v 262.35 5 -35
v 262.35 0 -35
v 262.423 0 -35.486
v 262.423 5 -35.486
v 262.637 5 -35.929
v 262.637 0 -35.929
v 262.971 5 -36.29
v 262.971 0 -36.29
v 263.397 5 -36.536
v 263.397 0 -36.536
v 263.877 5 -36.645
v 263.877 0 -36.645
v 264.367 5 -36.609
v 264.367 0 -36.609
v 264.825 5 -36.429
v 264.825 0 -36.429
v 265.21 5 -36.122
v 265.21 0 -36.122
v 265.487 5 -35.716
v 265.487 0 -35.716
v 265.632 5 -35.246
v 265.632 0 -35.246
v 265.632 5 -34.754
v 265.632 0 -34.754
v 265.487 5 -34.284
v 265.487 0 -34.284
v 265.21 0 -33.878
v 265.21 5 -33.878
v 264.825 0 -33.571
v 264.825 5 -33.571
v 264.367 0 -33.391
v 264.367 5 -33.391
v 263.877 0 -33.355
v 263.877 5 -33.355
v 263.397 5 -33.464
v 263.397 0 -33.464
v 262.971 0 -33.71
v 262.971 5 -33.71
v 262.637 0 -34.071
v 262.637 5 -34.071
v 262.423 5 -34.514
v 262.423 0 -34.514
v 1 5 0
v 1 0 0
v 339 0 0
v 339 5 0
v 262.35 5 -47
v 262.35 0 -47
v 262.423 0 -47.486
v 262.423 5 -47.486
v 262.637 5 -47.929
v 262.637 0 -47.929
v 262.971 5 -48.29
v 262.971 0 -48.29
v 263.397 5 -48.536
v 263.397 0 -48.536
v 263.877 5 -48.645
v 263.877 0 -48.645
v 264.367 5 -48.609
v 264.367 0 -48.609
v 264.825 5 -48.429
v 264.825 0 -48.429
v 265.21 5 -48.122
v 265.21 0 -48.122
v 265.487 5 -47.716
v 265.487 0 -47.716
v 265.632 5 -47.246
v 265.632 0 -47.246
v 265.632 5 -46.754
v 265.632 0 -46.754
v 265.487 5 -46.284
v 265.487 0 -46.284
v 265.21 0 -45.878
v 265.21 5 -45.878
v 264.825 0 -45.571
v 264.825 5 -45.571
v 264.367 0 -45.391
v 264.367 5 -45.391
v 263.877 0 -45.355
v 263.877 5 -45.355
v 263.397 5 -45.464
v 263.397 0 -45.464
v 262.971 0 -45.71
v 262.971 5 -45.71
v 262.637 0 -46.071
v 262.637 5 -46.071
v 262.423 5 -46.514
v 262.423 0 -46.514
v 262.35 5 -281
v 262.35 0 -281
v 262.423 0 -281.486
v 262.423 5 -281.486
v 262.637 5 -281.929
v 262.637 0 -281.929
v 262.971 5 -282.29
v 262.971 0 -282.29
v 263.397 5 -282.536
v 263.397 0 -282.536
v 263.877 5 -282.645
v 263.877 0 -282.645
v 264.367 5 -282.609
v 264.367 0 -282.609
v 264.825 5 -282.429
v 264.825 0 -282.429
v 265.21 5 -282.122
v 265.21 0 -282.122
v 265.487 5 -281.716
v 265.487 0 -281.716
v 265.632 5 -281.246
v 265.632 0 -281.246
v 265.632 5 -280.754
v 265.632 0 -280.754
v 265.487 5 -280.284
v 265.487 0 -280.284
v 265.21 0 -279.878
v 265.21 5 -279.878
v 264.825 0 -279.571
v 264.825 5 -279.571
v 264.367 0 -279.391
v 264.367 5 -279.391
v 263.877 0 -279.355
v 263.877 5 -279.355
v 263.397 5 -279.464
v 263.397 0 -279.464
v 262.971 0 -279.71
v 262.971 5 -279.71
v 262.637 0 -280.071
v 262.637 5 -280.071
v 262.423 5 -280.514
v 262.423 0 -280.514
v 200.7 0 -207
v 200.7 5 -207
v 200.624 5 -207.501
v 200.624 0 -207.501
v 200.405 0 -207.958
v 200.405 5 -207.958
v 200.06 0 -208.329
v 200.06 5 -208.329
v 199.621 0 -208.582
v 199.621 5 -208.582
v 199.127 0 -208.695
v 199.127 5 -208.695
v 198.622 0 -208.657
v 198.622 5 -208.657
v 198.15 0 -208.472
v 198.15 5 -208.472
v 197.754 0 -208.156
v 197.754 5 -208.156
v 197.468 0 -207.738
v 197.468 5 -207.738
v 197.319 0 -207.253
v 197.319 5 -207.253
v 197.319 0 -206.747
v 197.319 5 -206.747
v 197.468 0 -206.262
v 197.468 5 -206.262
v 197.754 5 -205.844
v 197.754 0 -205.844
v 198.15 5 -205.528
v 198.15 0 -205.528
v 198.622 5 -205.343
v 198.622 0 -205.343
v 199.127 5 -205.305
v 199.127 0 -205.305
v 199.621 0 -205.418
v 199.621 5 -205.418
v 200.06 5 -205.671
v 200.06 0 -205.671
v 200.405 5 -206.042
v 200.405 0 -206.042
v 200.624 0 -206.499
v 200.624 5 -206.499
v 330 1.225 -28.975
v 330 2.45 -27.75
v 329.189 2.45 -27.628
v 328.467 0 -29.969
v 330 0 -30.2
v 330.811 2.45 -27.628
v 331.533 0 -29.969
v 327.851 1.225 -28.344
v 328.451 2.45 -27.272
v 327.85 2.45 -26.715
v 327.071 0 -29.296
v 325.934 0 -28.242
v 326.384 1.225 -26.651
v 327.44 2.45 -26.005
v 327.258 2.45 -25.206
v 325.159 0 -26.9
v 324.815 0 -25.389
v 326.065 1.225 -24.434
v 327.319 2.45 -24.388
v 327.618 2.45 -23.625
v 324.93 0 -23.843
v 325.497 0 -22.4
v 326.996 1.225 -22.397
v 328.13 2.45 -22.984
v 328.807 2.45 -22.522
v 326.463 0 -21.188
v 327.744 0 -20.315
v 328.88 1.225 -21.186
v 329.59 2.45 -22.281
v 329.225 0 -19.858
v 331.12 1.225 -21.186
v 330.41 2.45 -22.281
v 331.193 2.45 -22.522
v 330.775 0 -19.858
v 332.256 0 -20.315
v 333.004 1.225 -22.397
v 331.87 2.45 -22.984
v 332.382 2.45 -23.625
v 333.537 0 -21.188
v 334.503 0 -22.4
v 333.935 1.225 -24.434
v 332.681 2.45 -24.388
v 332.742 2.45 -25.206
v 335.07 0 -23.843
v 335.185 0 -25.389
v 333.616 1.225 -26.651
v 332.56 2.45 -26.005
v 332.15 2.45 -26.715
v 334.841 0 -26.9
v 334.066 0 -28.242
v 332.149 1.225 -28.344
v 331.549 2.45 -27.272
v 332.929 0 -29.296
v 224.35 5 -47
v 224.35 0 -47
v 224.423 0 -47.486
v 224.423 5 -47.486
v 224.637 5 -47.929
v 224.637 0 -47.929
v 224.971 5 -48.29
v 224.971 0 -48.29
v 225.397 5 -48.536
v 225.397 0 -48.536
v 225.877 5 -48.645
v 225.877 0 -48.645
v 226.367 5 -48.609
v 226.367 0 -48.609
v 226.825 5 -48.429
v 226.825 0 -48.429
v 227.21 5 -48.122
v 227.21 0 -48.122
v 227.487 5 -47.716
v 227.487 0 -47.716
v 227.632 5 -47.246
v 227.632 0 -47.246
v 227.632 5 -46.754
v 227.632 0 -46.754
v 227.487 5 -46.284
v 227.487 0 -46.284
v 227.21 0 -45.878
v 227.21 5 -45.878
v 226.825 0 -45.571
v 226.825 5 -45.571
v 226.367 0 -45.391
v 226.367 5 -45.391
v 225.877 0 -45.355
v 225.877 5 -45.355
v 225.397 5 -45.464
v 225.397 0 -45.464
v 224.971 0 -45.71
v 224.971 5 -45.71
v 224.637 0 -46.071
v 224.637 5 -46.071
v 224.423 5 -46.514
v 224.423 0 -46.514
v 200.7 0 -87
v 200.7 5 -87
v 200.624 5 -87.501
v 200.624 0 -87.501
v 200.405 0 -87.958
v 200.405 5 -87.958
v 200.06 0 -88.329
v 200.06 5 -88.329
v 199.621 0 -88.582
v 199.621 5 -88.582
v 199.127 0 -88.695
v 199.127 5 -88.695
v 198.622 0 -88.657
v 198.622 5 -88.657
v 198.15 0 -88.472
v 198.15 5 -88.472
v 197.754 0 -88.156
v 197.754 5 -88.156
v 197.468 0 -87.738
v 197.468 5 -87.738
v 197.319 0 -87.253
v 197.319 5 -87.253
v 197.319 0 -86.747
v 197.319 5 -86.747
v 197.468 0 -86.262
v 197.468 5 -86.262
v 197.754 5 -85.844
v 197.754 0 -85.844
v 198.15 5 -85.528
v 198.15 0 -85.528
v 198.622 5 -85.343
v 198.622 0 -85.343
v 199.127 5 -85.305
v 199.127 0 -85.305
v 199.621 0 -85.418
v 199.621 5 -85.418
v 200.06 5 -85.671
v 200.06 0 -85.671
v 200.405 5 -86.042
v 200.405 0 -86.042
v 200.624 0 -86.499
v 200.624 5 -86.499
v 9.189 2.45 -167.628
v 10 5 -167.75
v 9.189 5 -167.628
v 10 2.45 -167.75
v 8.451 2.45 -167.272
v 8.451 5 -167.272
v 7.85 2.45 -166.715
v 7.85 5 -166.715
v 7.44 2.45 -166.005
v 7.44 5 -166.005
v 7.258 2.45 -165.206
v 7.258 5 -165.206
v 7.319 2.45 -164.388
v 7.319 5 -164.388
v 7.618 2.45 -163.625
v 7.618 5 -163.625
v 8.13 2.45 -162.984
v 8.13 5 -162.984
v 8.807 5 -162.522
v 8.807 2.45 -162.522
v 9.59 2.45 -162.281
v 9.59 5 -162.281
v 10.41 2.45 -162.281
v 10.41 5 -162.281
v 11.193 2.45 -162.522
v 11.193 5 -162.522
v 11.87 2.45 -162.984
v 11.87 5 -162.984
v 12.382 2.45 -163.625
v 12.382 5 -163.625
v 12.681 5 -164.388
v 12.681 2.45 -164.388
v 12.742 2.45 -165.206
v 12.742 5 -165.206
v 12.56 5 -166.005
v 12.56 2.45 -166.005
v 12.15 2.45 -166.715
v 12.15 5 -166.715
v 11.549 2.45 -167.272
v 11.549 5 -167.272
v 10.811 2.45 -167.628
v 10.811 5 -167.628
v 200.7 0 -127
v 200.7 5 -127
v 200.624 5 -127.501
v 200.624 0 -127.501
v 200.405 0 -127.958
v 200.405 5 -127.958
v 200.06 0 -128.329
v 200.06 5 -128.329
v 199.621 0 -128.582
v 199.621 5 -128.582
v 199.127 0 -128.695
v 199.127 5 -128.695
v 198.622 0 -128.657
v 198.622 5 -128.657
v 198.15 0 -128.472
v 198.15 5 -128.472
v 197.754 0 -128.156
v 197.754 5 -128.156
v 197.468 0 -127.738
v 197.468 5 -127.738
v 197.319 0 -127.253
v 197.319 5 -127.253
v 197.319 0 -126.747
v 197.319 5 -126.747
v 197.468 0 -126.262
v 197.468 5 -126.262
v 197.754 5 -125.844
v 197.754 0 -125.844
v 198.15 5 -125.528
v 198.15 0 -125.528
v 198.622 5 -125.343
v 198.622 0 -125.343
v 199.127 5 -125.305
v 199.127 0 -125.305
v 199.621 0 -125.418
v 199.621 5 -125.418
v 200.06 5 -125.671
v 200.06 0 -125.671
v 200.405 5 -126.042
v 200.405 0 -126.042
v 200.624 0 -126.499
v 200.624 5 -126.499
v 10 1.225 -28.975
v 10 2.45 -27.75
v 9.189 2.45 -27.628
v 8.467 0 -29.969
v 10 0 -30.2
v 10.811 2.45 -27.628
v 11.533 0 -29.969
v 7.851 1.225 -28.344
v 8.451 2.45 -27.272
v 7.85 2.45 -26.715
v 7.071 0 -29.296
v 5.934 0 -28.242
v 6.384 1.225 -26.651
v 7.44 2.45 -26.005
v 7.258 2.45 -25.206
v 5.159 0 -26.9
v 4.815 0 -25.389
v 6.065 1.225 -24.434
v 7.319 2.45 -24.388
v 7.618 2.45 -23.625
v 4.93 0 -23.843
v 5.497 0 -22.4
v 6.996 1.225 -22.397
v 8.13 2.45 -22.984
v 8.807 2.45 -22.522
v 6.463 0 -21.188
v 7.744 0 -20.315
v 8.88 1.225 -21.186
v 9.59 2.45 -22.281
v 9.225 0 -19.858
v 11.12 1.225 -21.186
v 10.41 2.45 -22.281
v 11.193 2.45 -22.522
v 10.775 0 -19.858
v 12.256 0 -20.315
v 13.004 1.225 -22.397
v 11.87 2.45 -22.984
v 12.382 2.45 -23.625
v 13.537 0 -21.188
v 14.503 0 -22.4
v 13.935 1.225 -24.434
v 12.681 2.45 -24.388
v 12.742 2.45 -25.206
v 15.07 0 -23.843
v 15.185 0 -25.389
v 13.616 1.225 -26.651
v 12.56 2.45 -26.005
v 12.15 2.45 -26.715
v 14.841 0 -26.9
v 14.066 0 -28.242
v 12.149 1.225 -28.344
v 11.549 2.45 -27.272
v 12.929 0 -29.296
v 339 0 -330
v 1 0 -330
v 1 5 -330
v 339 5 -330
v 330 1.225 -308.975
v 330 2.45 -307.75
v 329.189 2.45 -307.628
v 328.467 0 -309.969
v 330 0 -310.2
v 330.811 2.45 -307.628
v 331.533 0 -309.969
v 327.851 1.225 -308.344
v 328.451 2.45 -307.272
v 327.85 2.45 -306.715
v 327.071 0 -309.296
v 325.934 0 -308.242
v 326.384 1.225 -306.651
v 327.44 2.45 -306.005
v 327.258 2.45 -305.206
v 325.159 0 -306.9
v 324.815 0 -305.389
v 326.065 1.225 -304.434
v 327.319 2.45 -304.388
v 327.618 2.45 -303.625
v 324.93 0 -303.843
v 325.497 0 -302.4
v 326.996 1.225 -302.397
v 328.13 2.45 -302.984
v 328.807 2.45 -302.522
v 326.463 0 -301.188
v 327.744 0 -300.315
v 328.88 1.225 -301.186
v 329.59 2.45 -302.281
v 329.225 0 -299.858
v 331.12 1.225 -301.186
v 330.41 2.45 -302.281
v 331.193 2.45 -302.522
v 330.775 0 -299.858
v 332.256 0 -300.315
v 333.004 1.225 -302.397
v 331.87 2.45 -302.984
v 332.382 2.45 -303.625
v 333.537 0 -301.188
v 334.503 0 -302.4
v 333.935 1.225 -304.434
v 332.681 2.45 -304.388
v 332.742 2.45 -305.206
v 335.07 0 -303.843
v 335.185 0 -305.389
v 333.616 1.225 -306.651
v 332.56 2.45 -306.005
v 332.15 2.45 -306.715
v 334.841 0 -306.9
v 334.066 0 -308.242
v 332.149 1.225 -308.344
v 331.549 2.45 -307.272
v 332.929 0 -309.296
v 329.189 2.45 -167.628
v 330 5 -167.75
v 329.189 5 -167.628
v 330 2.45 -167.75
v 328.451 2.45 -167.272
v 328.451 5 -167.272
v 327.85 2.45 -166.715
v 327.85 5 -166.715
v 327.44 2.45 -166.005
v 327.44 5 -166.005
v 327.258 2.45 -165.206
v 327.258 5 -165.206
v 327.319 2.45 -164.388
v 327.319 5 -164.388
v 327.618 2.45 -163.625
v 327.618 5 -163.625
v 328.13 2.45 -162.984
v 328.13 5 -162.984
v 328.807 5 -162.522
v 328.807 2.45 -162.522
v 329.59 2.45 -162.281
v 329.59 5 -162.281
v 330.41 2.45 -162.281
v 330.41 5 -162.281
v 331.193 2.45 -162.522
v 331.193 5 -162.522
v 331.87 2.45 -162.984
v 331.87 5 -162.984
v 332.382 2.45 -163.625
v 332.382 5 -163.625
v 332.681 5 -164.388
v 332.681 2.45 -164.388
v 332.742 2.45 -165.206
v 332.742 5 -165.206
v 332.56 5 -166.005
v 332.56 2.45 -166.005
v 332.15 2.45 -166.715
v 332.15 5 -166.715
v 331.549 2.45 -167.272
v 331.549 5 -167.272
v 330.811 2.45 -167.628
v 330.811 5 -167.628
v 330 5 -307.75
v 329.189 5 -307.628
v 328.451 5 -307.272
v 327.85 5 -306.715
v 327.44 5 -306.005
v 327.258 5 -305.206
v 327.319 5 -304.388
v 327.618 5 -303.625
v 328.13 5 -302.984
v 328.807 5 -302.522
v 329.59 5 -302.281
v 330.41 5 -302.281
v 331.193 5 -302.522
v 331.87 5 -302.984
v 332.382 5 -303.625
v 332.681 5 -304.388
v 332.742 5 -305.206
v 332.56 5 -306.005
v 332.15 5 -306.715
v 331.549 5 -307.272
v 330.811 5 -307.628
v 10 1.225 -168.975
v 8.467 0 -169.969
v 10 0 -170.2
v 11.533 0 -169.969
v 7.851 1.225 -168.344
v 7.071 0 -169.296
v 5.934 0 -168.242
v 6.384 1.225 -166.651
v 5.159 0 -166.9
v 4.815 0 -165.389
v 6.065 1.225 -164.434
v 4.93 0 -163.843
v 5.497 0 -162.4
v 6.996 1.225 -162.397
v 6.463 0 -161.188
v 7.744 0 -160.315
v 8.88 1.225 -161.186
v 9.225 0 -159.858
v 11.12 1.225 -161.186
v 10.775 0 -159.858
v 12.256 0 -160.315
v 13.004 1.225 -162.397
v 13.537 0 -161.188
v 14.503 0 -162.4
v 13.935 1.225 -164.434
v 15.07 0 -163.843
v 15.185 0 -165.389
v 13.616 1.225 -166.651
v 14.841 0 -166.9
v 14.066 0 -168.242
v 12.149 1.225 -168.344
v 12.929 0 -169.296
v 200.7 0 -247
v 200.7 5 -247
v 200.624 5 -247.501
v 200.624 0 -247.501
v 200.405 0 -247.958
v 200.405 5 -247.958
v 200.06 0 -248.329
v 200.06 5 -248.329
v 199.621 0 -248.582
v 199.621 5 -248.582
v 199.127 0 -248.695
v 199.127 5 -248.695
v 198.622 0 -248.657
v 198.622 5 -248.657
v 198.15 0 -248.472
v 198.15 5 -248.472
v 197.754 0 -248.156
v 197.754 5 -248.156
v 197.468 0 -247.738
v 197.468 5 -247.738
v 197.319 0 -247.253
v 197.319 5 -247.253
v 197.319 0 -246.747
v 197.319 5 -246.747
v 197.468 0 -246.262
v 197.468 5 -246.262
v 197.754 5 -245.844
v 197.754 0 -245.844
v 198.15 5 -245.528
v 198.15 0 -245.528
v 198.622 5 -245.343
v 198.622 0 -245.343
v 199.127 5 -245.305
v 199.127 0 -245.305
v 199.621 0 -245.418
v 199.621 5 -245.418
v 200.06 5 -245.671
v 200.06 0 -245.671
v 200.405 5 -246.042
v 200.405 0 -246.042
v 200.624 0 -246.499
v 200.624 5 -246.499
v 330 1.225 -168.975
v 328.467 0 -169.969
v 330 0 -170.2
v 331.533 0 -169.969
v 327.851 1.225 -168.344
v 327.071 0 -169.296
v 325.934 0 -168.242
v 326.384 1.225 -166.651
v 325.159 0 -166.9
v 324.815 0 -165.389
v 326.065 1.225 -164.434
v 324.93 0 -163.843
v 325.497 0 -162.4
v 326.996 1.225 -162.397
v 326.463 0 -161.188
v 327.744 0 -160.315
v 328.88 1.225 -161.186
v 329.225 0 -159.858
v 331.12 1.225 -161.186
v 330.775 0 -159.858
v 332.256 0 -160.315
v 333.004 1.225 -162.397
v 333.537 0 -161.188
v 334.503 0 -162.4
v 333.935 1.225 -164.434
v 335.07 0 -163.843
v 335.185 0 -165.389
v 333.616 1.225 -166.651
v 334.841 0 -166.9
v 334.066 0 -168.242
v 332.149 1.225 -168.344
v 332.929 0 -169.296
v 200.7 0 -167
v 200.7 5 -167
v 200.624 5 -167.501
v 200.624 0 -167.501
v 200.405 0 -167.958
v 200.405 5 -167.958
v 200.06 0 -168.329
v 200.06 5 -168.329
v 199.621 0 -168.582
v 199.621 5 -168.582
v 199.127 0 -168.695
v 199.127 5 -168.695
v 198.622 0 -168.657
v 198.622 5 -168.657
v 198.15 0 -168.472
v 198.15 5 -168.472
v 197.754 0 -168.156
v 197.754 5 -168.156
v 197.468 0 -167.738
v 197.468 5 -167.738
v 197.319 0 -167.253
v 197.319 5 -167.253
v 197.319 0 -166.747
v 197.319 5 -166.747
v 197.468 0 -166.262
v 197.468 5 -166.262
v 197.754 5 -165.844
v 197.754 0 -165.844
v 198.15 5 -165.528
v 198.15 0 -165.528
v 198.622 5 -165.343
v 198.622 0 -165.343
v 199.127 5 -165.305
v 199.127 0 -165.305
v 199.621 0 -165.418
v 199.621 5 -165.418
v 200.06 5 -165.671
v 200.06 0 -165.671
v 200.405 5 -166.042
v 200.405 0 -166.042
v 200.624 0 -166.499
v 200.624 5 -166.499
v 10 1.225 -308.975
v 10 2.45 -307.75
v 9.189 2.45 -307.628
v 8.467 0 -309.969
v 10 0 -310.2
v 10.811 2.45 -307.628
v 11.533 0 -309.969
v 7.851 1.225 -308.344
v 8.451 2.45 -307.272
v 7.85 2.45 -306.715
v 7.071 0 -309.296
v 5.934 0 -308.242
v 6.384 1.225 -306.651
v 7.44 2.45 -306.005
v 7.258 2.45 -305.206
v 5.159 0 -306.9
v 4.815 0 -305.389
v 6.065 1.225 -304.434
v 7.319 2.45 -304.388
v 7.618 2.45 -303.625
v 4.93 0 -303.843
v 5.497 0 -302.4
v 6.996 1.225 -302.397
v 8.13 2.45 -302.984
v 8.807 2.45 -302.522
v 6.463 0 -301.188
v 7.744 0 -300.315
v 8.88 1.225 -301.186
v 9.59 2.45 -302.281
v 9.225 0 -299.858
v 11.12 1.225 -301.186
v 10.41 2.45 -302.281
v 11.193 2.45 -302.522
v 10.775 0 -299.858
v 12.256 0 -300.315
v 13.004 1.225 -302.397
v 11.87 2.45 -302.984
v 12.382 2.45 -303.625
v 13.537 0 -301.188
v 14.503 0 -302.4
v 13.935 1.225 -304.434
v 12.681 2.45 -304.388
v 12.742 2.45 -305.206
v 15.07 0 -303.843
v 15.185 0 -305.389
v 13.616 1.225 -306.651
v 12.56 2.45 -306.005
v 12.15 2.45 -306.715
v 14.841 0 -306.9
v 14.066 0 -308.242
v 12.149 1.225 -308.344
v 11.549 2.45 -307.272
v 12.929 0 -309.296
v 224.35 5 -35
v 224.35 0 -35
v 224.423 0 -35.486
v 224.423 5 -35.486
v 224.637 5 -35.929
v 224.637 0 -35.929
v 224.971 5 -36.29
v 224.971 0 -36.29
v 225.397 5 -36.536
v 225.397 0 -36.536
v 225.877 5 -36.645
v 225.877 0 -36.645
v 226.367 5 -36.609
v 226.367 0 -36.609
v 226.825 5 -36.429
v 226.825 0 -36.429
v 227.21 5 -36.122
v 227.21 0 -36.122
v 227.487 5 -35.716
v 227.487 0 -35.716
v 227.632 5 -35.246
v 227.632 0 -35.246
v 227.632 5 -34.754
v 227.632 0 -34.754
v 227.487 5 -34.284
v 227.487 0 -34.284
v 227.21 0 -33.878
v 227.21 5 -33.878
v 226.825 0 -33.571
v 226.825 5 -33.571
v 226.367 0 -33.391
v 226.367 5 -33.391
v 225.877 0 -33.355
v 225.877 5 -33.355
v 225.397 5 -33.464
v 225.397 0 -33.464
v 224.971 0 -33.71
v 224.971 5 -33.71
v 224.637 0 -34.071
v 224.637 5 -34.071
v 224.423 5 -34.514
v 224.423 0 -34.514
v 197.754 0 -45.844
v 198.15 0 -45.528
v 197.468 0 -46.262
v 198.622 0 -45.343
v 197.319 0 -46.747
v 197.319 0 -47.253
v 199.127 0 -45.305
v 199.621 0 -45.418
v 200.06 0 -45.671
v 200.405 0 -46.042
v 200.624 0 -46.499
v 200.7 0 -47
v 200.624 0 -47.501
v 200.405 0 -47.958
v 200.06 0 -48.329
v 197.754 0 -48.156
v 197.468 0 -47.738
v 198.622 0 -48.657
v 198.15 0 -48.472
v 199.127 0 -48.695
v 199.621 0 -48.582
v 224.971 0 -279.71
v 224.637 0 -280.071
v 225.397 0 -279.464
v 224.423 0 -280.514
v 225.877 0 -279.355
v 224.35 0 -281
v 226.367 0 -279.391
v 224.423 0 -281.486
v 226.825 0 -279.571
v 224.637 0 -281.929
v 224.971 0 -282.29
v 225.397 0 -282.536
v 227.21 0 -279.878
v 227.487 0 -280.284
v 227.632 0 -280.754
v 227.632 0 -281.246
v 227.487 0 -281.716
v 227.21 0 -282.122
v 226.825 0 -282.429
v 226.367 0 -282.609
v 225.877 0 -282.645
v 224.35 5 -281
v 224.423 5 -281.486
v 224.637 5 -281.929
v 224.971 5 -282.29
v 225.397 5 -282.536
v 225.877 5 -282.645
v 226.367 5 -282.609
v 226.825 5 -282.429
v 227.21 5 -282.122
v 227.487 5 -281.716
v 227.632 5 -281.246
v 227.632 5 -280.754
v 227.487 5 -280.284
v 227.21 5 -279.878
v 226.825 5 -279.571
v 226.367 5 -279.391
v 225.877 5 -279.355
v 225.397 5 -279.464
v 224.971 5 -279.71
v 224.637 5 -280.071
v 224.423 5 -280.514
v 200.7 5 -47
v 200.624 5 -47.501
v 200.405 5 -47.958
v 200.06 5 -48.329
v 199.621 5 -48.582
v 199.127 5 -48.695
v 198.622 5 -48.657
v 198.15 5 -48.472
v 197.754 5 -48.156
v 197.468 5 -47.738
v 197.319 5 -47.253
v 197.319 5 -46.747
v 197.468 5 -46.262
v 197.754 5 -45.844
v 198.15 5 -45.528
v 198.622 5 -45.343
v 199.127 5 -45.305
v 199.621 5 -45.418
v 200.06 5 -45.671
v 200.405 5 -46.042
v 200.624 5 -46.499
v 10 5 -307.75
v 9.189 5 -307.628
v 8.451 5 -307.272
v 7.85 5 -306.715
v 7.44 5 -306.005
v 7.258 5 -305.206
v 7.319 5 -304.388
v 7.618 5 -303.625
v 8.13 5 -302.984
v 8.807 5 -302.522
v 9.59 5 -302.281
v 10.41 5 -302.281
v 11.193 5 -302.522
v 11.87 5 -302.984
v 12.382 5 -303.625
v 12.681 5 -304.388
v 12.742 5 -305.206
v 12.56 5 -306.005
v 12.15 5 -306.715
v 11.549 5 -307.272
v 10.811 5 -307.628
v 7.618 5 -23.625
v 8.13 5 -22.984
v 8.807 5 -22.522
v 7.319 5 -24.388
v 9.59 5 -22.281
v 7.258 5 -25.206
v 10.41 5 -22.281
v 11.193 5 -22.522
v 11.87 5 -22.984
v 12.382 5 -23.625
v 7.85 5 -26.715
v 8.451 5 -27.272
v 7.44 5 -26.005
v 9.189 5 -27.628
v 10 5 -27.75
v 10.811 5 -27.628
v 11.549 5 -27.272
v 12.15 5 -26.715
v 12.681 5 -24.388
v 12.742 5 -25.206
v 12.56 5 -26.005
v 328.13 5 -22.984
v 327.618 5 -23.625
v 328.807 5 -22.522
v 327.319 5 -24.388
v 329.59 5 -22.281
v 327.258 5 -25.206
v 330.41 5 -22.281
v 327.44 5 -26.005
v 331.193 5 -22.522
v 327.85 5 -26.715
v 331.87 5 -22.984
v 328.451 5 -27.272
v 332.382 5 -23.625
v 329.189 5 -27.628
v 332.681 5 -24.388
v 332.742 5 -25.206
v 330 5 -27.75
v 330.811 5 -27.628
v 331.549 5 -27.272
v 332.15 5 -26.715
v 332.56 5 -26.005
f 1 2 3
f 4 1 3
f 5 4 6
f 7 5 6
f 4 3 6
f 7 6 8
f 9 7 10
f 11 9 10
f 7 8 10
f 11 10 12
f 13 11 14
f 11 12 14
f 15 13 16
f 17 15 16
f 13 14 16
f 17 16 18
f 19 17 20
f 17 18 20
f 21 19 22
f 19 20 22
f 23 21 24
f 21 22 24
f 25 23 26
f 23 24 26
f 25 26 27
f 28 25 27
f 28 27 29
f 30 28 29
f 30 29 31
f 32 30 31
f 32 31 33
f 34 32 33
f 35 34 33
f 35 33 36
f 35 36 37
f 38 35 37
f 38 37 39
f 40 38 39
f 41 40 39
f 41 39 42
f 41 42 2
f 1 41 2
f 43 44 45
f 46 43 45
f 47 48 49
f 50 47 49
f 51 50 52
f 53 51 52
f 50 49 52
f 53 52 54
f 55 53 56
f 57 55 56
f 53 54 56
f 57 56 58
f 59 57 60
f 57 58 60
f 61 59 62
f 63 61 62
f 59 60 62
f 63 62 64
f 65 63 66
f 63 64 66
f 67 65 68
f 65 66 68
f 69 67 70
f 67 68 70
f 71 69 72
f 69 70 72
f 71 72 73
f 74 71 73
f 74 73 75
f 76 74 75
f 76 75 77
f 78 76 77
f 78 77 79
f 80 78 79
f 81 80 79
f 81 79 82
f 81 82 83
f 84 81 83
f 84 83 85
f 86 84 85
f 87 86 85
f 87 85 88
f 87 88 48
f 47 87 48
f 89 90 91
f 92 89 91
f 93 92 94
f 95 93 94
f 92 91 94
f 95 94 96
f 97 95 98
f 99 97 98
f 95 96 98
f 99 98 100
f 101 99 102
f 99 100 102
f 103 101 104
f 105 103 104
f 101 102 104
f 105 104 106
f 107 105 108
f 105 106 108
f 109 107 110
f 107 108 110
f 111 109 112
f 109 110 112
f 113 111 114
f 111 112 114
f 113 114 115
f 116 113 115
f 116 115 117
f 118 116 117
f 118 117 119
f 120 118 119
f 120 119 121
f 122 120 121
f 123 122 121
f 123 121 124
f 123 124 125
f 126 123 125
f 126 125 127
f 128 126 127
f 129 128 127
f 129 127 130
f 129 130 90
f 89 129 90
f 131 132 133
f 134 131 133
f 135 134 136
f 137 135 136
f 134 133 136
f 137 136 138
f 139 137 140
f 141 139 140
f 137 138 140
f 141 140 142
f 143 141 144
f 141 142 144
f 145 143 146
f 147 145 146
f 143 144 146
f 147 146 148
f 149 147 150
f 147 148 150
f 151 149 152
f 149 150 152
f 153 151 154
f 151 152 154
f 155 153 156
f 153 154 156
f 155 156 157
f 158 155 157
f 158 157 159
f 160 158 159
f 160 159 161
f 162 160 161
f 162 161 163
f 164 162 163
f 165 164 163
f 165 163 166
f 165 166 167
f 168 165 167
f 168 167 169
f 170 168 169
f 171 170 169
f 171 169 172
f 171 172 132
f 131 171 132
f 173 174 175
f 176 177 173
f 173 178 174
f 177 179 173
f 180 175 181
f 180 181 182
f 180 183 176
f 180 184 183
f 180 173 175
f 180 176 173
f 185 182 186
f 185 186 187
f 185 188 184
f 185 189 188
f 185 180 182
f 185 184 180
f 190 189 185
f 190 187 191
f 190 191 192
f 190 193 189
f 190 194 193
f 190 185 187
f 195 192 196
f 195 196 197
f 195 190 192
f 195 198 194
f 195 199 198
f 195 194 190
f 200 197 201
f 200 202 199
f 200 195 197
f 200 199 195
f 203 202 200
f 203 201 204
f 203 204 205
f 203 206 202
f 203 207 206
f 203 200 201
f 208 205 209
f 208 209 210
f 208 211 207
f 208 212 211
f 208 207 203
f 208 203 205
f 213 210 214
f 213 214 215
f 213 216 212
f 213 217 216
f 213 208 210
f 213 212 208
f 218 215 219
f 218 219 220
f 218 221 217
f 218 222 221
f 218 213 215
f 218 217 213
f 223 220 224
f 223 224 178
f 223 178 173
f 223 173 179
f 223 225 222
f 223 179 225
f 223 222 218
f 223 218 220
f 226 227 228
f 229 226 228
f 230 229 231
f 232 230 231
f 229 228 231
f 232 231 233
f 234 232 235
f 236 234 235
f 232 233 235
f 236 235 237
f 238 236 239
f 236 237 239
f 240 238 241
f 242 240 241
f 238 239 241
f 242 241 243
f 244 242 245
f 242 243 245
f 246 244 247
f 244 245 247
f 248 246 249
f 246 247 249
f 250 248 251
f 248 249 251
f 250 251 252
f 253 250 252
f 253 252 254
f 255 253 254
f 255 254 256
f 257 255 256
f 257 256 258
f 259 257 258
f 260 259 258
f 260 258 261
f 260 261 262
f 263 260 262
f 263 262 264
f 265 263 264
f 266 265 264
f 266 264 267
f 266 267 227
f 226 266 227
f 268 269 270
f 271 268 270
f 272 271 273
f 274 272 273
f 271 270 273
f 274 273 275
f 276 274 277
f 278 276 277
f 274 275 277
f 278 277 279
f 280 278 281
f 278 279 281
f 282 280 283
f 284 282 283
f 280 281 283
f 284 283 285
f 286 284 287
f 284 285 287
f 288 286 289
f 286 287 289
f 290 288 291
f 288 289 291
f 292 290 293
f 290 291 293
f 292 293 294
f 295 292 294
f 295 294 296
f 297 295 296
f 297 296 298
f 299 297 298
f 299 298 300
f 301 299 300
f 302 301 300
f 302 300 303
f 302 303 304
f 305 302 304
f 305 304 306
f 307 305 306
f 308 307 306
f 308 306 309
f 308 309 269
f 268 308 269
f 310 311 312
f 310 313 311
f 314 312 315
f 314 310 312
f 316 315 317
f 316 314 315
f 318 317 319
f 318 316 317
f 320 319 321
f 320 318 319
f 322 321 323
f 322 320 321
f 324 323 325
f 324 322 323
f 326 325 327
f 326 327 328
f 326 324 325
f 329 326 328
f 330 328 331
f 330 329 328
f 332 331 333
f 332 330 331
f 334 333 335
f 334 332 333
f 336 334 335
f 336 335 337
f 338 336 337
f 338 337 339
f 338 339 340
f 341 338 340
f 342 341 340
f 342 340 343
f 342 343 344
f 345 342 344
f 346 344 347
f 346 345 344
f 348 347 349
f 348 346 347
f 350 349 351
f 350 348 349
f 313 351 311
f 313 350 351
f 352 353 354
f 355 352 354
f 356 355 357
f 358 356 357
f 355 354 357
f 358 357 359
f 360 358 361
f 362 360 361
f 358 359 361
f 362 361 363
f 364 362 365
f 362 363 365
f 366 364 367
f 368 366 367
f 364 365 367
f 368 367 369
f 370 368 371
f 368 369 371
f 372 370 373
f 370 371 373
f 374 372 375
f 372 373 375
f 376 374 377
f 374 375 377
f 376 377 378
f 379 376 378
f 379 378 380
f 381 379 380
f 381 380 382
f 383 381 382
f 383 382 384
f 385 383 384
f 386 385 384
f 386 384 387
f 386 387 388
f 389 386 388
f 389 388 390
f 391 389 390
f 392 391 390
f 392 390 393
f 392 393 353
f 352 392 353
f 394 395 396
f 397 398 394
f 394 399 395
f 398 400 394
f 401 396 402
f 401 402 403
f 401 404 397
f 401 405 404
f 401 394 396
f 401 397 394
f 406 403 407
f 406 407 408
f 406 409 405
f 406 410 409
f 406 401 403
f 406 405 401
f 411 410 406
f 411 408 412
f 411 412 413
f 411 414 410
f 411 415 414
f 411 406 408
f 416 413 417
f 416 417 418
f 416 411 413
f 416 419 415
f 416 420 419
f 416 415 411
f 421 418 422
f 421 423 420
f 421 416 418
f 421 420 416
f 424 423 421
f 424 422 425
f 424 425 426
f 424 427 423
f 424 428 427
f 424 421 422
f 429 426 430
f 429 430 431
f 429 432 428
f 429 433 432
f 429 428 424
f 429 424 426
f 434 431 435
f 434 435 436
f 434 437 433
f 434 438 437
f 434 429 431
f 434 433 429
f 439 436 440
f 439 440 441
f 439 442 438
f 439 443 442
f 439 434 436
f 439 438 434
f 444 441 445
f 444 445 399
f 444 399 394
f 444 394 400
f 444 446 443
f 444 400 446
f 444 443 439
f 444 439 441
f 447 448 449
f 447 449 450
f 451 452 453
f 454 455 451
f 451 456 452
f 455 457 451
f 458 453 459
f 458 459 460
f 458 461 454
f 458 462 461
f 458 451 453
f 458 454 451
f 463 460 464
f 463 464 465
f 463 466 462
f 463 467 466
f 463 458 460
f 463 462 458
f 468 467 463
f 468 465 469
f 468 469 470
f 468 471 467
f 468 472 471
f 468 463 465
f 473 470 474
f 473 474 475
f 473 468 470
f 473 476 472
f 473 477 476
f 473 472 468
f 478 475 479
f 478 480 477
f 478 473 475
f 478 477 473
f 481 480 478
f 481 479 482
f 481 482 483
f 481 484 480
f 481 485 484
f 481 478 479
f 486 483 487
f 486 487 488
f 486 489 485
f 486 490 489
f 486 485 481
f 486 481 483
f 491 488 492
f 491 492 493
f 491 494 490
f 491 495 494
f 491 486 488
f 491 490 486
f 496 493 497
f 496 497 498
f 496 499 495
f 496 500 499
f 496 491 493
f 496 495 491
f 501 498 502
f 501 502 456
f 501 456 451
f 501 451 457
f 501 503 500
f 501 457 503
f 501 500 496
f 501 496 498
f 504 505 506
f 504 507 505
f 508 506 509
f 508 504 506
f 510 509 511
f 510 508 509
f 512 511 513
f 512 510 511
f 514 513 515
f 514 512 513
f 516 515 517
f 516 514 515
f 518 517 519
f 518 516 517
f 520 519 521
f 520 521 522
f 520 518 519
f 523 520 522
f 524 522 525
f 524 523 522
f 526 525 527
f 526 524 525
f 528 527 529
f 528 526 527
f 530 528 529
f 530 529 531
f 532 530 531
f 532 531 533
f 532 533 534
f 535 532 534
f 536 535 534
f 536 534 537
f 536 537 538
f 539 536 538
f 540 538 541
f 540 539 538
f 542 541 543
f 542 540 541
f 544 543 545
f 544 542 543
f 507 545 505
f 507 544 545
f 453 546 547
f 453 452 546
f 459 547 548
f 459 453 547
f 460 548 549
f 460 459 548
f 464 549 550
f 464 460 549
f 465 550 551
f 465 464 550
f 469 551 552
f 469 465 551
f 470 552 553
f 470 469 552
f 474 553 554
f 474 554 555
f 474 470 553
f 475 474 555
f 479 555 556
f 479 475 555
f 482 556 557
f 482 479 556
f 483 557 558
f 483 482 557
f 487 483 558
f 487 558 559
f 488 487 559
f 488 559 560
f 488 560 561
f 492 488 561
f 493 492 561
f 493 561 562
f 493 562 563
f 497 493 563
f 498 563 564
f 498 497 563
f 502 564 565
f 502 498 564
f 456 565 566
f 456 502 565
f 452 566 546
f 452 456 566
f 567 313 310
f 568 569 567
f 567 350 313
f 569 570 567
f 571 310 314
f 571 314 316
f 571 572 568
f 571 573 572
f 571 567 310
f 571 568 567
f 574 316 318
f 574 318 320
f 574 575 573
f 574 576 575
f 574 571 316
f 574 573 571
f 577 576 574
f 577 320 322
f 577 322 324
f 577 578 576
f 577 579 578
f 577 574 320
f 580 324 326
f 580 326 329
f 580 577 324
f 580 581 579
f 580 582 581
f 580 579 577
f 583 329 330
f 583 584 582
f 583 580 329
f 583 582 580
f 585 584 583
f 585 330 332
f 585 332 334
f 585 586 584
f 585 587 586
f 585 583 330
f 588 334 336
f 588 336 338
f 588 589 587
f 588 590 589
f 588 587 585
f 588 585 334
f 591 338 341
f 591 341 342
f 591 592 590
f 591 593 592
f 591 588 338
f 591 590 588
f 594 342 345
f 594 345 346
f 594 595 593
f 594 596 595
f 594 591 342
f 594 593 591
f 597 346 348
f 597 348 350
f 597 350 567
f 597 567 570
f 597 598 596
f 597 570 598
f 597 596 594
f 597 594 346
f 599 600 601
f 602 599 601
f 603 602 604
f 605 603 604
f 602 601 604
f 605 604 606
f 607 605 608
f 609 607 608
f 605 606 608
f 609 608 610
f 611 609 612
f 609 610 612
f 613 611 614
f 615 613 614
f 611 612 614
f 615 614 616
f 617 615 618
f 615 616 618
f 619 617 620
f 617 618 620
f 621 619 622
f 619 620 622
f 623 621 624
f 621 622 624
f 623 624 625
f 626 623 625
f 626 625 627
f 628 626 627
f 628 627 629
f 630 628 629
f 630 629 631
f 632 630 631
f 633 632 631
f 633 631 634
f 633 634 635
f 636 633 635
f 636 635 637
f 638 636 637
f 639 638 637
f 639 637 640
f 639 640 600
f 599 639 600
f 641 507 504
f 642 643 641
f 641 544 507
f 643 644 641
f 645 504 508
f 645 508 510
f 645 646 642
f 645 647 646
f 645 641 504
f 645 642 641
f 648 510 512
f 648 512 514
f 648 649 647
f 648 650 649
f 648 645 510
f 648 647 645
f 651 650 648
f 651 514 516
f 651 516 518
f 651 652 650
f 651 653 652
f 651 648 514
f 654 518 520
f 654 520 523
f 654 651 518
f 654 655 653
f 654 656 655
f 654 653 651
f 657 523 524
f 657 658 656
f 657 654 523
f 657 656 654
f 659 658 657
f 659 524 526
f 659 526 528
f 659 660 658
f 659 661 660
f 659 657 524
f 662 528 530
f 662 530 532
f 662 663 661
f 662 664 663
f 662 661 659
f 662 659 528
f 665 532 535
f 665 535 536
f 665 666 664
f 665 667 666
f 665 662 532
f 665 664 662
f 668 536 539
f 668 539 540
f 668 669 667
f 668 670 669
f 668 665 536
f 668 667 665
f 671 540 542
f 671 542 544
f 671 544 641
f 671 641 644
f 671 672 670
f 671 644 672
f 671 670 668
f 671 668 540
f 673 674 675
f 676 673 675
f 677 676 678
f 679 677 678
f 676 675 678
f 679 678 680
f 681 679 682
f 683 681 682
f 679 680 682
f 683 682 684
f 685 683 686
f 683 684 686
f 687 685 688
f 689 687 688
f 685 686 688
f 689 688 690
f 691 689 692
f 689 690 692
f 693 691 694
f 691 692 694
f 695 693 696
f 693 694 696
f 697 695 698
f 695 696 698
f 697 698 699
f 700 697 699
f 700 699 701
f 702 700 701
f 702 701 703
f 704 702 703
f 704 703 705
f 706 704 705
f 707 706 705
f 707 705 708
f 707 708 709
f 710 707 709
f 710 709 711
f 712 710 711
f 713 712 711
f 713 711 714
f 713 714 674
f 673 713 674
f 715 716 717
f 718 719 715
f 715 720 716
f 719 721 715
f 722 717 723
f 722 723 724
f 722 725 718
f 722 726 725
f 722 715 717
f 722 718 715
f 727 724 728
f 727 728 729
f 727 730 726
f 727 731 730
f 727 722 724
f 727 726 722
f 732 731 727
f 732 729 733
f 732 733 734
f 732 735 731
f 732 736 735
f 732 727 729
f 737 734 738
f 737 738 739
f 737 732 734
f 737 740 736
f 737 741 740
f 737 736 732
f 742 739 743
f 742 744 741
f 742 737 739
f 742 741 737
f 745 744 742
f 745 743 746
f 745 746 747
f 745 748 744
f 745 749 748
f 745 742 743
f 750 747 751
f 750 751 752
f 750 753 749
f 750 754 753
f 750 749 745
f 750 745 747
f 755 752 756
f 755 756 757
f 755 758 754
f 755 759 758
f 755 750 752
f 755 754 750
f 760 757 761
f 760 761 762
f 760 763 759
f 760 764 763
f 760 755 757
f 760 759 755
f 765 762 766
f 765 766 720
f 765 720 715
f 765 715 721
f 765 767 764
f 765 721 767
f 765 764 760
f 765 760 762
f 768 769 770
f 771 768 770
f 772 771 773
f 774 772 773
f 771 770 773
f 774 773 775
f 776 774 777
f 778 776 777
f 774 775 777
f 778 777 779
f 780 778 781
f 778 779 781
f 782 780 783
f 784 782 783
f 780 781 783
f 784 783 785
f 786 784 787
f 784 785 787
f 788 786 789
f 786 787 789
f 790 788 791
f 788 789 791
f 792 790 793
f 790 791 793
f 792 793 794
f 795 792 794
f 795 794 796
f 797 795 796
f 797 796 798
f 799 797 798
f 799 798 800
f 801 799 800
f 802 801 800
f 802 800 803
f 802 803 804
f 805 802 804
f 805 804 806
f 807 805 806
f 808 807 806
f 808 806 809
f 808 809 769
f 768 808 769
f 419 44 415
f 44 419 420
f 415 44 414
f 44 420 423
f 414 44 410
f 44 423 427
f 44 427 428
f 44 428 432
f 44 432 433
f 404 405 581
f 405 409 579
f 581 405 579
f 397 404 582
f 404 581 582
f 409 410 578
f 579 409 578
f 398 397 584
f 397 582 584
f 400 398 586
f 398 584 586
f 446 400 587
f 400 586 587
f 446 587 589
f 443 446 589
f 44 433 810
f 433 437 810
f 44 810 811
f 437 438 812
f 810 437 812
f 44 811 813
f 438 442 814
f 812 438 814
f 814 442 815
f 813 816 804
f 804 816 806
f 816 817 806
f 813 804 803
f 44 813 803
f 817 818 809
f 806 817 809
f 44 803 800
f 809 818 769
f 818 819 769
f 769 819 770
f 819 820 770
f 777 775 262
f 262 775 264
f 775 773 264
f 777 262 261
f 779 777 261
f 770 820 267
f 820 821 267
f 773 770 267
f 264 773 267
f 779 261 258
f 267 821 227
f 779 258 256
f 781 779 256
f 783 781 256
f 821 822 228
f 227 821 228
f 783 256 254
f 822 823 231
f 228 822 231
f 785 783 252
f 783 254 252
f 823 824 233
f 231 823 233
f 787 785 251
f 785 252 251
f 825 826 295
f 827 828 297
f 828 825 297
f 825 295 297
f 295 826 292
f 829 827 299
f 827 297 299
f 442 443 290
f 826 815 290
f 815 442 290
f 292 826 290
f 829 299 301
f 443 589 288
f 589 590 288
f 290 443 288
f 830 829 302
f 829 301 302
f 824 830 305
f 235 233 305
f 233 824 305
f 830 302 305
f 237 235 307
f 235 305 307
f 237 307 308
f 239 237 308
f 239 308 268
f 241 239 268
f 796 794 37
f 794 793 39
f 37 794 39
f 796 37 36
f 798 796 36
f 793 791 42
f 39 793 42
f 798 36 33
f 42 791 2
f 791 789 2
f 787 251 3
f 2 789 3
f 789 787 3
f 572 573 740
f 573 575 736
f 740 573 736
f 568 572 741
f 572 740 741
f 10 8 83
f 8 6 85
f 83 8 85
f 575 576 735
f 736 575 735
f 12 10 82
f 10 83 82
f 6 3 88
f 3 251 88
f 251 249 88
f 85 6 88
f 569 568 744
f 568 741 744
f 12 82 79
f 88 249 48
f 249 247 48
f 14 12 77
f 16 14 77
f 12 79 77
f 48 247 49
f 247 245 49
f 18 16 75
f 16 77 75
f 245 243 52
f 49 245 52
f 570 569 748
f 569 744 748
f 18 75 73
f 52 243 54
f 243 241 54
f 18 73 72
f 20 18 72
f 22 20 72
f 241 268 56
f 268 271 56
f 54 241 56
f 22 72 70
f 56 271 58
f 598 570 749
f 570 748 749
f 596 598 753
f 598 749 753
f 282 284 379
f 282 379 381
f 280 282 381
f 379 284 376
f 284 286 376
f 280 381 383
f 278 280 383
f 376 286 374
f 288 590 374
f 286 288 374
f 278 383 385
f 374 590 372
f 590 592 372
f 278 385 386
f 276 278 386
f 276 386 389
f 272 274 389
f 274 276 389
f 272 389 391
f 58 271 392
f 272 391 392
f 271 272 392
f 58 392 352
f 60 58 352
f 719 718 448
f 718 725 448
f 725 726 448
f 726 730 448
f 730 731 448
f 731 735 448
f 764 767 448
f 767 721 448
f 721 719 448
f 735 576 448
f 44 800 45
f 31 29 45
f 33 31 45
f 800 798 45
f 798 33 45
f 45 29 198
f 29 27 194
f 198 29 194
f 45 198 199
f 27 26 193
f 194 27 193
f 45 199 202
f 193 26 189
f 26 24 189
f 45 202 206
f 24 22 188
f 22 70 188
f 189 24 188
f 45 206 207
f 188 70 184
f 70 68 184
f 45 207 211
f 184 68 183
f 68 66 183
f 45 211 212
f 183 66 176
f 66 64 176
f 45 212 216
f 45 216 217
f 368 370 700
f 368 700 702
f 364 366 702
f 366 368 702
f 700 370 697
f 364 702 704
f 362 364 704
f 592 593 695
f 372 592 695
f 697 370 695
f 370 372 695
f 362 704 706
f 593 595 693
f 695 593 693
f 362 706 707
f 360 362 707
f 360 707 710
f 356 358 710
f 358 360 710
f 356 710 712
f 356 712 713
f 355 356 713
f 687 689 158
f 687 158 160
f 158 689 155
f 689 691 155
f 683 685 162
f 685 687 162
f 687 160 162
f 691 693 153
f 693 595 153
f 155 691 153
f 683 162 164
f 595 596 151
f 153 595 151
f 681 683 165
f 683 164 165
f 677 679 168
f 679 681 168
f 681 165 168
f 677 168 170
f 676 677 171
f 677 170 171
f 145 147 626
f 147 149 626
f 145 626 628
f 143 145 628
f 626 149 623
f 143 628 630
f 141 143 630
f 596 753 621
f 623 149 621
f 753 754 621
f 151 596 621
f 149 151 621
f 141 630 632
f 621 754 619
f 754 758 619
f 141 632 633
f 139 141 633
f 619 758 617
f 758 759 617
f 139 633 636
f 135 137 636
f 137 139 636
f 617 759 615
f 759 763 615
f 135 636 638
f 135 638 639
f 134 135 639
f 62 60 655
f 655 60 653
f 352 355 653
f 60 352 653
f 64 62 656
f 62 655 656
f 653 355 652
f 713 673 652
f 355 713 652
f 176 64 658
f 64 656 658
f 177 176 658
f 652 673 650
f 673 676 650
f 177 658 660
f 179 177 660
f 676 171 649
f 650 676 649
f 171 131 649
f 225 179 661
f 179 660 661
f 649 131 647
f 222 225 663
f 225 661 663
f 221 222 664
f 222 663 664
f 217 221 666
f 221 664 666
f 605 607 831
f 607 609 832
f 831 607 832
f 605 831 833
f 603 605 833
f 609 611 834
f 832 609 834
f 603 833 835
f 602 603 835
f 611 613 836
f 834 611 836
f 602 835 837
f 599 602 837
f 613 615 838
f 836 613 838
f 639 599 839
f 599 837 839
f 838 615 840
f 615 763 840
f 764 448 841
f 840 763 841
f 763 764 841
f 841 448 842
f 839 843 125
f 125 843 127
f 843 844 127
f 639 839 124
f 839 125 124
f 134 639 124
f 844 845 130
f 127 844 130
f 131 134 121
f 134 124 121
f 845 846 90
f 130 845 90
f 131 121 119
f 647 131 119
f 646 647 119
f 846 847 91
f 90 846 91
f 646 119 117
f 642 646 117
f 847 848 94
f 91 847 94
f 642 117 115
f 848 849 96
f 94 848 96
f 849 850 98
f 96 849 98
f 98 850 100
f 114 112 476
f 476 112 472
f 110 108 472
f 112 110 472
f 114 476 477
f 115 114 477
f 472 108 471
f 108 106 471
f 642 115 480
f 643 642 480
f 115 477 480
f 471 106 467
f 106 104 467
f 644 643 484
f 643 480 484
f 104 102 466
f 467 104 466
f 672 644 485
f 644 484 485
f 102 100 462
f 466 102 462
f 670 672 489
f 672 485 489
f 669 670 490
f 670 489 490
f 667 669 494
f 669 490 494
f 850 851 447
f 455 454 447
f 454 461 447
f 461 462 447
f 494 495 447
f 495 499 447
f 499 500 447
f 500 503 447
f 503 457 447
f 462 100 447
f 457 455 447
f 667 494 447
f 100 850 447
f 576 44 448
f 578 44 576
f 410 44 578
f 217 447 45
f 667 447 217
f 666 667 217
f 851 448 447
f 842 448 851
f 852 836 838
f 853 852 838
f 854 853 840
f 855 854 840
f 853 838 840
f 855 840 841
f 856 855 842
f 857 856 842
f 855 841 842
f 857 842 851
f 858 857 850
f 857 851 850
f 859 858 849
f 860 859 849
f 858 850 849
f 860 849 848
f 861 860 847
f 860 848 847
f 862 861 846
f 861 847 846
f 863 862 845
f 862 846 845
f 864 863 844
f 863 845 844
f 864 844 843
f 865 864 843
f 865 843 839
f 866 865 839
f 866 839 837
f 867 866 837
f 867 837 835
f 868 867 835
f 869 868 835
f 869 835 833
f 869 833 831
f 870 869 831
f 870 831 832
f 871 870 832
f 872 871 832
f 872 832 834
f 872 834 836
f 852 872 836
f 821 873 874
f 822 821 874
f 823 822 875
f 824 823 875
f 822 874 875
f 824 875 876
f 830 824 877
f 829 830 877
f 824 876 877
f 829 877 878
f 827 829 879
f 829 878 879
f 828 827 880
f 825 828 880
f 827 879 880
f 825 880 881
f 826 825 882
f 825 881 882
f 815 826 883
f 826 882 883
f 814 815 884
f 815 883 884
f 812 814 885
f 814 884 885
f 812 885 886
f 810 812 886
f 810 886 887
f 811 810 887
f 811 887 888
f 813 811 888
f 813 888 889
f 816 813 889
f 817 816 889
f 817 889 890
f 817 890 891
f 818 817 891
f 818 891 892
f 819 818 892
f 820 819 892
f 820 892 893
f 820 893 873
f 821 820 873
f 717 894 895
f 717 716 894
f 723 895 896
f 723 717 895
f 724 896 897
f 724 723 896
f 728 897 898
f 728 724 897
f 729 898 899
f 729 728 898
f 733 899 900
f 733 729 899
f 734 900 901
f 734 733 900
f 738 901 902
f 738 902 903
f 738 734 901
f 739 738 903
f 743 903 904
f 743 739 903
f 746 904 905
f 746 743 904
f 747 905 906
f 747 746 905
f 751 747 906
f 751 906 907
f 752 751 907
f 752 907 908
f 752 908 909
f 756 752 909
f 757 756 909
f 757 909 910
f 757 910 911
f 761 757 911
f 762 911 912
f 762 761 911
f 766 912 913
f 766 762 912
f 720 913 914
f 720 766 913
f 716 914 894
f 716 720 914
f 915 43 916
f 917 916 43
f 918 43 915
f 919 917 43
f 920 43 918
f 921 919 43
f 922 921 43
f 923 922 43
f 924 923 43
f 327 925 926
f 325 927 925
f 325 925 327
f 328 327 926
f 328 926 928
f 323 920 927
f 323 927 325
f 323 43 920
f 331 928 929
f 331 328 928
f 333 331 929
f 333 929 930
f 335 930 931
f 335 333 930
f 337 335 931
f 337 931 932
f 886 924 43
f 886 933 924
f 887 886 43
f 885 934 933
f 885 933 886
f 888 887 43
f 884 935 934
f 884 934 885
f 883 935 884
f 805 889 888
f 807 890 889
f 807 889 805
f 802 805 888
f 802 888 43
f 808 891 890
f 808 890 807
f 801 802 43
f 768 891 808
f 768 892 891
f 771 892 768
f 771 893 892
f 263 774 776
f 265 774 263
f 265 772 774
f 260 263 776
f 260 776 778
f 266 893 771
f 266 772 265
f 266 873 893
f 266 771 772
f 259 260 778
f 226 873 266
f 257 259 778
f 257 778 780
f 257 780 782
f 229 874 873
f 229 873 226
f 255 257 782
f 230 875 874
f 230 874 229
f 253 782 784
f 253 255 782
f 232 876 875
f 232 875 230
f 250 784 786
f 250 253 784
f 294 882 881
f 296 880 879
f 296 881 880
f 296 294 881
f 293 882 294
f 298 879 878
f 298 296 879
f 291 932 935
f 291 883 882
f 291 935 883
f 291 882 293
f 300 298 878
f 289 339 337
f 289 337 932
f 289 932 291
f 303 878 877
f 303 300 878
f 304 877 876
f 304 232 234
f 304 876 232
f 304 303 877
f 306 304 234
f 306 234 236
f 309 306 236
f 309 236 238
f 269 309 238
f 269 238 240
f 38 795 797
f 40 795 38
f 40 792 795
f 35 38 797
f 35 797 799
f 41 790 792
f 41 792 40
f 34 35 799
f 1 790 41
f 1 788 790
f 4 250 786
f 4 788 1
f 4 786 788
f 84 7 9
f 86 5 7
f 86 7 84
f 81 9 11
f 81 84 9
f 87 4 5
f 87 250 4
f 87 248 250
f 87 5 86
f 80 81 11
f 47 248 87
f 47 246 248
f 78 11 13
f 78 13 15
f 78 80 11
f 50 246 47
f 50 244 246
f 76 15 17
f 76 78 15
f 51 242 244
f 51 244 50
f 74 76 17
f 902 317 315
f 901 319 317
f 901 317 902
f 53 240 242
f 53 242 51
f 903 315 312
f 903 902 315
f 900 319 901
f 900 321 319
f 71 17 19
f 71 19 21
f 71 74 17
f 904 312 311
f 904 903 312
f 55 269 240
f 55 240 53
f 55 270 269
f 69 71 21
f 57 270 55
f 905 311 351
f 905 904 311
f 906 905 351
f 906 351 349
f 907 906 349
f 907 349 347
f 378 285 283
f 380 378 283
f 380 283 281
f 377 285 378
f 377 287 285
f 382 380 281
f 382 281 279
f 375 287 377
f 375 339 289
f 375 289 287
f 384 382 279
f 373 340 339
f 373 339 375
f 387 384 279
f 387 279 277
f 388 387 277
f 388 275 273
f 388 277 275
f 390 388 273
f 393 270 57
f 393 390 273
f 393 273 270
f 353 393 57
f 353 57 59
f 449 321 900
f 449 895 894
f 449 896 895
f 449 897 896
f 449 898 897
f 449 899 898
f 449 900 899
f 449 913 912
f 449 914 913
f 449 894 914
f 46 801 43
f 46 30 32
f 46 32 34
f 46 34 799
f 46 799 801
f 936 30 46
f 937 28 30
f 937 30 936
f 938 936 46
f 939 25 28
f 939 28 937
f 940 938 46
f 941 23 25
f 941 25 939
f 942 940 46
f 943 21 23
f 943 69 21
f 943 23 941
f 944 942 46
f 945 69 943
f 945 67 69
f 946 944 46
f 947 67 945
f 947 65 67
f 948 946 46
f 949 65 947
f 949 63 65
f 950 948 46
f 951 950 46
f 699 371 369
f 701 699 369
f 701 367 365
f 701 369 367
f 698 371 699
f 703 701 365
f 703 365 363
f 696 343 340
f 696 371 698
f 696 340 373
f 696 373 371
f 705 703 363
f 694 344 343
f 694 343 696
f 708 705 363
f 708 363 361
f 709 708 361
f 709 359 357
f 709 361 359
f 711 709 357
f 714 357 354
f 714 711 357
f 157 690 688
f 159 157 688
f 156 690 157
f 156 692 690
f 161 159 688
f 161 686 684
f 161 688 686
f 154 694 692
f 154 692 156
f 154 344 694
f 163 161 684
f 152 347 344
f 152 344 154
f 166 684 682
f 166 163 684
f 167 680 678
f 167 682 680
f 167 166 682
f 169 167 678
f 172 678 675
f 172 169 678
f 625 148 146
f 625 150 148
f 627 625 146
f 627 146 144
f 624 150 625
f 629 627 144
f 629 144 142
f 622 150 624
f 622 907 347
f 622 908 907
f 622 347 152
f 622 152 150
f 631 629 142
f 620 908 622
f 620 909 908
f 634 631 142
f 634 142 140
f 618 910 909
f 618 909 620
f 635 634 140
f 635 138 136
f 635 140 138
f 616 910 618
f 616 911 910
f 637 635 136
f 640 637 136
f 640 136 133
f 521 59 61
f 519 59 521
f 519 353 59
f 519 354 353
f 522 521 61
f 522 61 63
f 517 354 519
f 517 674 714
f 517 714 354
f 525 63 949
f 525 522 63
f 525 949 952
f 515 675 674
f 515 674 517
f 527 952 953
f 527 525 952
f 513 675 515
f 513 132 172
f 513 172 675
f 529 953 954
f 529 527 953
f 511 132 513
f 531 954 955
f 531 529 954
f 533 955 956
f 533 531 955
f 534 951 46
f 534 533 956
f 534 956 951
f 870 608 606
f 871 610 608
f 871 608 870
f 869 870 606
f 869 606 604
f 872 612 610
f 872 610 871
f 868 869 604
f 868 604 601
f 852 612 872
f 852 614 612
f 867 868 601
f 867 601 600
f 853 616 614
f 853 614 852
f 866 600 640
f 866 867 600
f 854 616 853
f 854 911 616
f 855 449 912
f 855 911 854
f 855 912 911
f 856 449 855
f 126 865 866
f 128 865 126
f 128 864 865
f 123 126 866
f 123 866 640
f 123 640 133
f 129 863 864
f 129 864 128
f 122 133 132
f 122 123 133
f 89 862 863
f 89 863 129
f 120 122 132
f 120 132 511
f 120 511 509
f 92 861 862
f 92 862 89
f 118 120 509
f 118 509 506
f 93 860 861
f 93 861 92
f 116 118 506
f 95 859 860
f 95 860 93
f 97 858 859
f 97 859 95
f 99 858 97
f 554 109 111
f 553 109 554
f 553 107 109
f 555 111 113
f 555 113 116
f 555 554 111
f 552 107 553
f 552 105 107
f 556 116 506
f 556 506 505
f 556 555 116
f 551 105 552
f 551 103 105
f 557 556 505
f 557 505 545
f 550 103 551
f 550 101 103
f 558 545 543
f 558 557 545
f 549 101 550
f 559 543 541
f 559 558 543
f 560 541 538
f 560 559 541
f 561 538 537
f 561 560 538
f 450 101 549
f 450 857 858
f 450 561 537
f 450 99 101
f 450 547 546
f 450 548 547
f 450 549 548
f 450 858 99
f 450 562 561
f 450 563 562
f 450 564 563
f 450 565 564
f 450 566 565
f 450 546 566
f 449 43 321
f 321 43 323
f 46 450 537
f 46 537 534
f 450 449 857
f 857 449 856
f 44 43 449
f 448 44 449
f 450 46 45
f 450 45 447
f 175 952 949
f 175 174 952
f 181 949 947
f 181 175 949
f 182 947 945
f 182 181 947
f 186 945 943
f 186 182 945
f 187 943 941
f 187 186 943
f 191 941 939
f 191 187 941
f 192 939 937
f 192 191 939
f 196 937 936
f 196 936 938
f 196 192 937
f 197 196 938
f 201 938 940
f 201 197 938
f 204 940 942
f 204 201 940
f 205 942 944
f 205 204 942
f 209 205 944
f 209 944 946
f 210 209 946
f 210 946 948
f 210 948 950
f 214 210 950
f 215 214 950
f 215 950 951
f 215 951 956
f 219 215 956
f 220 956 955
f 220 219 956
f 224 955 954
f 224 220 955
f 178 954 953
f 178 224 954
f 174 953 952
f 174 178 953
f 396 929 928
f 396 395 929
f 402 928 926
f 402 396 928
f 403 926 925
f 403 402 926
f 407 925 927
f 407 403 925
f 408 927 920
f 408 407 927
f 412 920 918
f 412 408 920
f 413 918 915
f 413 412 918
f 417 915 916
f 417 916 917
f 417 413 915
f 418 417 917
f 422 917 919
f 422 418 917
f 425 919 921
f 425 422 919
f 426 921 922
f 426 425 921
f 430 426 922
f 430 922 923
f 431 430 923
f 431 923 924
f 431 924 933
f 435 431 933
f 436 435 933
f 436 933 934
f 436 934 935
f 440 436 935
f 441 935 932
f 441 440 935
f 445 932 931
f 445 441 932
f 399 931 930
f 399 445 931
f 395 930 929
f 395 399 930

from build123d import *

# Parameters (mm, degrees)
SKETCH_1_W                  = 340
SKETCH_1_H                  = 330
EXTRUDE_1_DEPTH             = 5
M4X0_7_2_D                  = 3.3
M4X0_7_2_DEPTH              = 11.5
M4X0_7_2_TIP                = 0.991420021
SKETCH_4_W                  = 1
SKETCH_4_H                  = 330
CUT_EXTRUDE_1_DEPTH         = 10
HOLE_WIZARD_M3_1_D          = 3.4
HOLE_WIZARD_M3_1_DEPTH      = 20
HOLE_WIZARD_M3_1_TIP        = 1.021463052
HOLE_WIZARD_M5_1_AT_2_COUNT = 2
HOLE_WIZARD_M5_1_AT_2_PITCH = 140
HOLE_WIZARD_M5_1_AT_3_COUNT = 2
HOLE_WIZARD_M5_1_AT_3_PITCH = 280
HOLE_WIZARD_M5_1_AT_4_COUNT = 2
HOLE_WIZARD_M5_1_AT_4_PITCH = 425.205832509
HOLE_WIZARD_M5_1_AT_5_COUNT = 2
HOLE_WIZARD_M5_1_AT_5_PITCH = 349.284983931
HOLE_WIZARD_M5_1_AT_6_COUNT = 2
HOLE_WIZARD_M5_1_AT_6_PITCH = 320


with BuildPart() as part:
    # 스케치1 → 보스-돌출1 (new body)
    with BuildSketch(Plane(origin=(0, 0, 0), x_dir=(1, 0, 0), z_dir=(0, 1, 0))):
        with Locations((170, 165)):
            Rectangle(SKETCH_1_W, SKETCH_1_H)
    extrude(amount=EXTRUDE_1_DEPTH)

    # M4x0.7 나사 구멍2
    with Locations(Plane(origin=(0, 5, 0), x_dir=(1, 0, 0), z_dir=(0, 1, 0))):
        with Locations((226, 281), (264, 281), (264, 35), (226, 35), (264, 47), (226, 47)):
            Hole(M4X0_7_2_D / 2, depth=M4X0_7_2_DEPTH)
            with Locations((0, 0, -(M4X0_7_2_DEPTH + M4X0_7_2_TIP / 2))):  # 118° drill point
                Cone(0, M4X0_7_2_D / 2, M4X0_7_2_TIP, mode=Mode.SUBTRACT)

    # 스케치4 → 컷-돌출1 (cut)
    with BuildSketch(Plane(origin=(0, 5, 0), x_dir=(1, 0, 0), z_dir=(0, 1, 0))):
        with Locations((339.5, 165)):
            Rectangle(SKETCH_4_W, SKETCH_4_H)
        with Locations((0.5, 165)):
            Rectangle(SKETCH_4_W, SKETCH_4_H)
    extrude(amount=-CUT_EXTRUDE_1_DEPTH, mode=Mode.SUBTRACT)

    # M3 여유 구멍1
    with Locations(Plane(origin=(0, 0, 0), x_dir=(-1, 0, 0), z_dir=(0, -1, 0))):
        with Locations((-199, 47), (-199, 87), (-199, 127), (-199, 167), (-199, 207), (-199, 247)):
            Hole(HOLE_WIZARD_M3_1_D / 2, depth=HOLE_WIZARD_M3_1_DEPTH)
            with Locations((0, 0, -(HOLE_WIZARD_M3_1_DEPTH + HOLE_WIZARD_M3_1_TIP / 2))):  # 118° drill point
                Cone(0, HOLE_WIZARD_M3_1_D / 2, HOLE_WIZARD_M3_1_TIP, mode=Mode.SUBTRACT)

    # 스케치7 → M5 납작 머리 작은 나사용 카운터싱크1 (revolve, cut)
    with BuildSketch(Plane(origin=(10, 0, -25), x_dir=(0, 0, -1), z_dir=(1, 0, 0))):
        Polygon((0, 0), (0, 5), (2.75, 5), (2.75, 2.45), (5.2, 0), align=None)
    hole_wizard_m5_1 = revolve(axis=Axis((10, -6.35, -25), (0, 1, 0)), mode=Mode.SUBTRACT)

    # M5 납작 머리 작은 나사용 카운터싱크1 at 2: M5 납작 머리 작은 나사용 카운터싱크1 ×2
    with Locations(*[(0, 0, -i * HOLE_WIZARD_M5_1_AT_2_PITCH) for i in range(1, HOLE_WIZARD_M5_1_AT_2_COUNT)]):
        add(hole_wizard_m5_1, mode=Mode.SUBTRACT)

    # M5 납작 머리 작은 나사용 카운터싱크1 at 3: M5 납작 머리 작은 나사용 카운터싱크1 ×2
    with Locations(*[(0, 0, -i * HOLE_WIZARD_M5_1_AT_3_PITCH) for i in range(1, HOLE_WIZARD_M5_1_AT_3_COUNT)]):
        add(hole_wizard_m5_1, mode=Mode.SUBTRACT)

    # M5 납작 머리 작은 나사용 카운터싱크1 at 4: M5 납작 머리 작은 나사용 카운터싱크1 ×2
    with Locations(*[Vector(0.7525766947068778, 0, -0.658504607868518) * (i * HOLE_WIZARD_M5_1_AT_4_PITCH) for i in range(1, HOLE_WIZARD_M5_1_AT_4_COUNT)]):
        add(hole_wizard_m5_1, mode=Mode.SUBTRACT)

    # M5 납작 머리 작은 나사용 카운터싱크1 at 5: M5 납작 머리 작은 나사용 카운터싱크1 ×2
    with Locations(*[Vector(0.9161573349021892, 0, -0.4008188340197077) * (i * HOLE_WIZARD_M5_1_AT_5_PITCH) for i in range(1, HOLE_WIZARD_M5_1_AT_5_COUNT)]):
        add(hole_wizard_m5_1, mode=Mode.SUBTRACT)

    # M5 납작 머리 작은 나사용 카운터싱크1 at 6: M5 납작 머리 작은 나사용 카운터싱크1 ×2
    with Locations(*[(i * HOLE_WIZARD_M5_1_AT_6_PITCH, 0, 0) for i in range(1, HOLE_WIZARD_M5_1_AT_6_COUNT)]):
        add(hole_wizard_m5_1, mode=Mode.SUBTRACT)


solid = part.part
